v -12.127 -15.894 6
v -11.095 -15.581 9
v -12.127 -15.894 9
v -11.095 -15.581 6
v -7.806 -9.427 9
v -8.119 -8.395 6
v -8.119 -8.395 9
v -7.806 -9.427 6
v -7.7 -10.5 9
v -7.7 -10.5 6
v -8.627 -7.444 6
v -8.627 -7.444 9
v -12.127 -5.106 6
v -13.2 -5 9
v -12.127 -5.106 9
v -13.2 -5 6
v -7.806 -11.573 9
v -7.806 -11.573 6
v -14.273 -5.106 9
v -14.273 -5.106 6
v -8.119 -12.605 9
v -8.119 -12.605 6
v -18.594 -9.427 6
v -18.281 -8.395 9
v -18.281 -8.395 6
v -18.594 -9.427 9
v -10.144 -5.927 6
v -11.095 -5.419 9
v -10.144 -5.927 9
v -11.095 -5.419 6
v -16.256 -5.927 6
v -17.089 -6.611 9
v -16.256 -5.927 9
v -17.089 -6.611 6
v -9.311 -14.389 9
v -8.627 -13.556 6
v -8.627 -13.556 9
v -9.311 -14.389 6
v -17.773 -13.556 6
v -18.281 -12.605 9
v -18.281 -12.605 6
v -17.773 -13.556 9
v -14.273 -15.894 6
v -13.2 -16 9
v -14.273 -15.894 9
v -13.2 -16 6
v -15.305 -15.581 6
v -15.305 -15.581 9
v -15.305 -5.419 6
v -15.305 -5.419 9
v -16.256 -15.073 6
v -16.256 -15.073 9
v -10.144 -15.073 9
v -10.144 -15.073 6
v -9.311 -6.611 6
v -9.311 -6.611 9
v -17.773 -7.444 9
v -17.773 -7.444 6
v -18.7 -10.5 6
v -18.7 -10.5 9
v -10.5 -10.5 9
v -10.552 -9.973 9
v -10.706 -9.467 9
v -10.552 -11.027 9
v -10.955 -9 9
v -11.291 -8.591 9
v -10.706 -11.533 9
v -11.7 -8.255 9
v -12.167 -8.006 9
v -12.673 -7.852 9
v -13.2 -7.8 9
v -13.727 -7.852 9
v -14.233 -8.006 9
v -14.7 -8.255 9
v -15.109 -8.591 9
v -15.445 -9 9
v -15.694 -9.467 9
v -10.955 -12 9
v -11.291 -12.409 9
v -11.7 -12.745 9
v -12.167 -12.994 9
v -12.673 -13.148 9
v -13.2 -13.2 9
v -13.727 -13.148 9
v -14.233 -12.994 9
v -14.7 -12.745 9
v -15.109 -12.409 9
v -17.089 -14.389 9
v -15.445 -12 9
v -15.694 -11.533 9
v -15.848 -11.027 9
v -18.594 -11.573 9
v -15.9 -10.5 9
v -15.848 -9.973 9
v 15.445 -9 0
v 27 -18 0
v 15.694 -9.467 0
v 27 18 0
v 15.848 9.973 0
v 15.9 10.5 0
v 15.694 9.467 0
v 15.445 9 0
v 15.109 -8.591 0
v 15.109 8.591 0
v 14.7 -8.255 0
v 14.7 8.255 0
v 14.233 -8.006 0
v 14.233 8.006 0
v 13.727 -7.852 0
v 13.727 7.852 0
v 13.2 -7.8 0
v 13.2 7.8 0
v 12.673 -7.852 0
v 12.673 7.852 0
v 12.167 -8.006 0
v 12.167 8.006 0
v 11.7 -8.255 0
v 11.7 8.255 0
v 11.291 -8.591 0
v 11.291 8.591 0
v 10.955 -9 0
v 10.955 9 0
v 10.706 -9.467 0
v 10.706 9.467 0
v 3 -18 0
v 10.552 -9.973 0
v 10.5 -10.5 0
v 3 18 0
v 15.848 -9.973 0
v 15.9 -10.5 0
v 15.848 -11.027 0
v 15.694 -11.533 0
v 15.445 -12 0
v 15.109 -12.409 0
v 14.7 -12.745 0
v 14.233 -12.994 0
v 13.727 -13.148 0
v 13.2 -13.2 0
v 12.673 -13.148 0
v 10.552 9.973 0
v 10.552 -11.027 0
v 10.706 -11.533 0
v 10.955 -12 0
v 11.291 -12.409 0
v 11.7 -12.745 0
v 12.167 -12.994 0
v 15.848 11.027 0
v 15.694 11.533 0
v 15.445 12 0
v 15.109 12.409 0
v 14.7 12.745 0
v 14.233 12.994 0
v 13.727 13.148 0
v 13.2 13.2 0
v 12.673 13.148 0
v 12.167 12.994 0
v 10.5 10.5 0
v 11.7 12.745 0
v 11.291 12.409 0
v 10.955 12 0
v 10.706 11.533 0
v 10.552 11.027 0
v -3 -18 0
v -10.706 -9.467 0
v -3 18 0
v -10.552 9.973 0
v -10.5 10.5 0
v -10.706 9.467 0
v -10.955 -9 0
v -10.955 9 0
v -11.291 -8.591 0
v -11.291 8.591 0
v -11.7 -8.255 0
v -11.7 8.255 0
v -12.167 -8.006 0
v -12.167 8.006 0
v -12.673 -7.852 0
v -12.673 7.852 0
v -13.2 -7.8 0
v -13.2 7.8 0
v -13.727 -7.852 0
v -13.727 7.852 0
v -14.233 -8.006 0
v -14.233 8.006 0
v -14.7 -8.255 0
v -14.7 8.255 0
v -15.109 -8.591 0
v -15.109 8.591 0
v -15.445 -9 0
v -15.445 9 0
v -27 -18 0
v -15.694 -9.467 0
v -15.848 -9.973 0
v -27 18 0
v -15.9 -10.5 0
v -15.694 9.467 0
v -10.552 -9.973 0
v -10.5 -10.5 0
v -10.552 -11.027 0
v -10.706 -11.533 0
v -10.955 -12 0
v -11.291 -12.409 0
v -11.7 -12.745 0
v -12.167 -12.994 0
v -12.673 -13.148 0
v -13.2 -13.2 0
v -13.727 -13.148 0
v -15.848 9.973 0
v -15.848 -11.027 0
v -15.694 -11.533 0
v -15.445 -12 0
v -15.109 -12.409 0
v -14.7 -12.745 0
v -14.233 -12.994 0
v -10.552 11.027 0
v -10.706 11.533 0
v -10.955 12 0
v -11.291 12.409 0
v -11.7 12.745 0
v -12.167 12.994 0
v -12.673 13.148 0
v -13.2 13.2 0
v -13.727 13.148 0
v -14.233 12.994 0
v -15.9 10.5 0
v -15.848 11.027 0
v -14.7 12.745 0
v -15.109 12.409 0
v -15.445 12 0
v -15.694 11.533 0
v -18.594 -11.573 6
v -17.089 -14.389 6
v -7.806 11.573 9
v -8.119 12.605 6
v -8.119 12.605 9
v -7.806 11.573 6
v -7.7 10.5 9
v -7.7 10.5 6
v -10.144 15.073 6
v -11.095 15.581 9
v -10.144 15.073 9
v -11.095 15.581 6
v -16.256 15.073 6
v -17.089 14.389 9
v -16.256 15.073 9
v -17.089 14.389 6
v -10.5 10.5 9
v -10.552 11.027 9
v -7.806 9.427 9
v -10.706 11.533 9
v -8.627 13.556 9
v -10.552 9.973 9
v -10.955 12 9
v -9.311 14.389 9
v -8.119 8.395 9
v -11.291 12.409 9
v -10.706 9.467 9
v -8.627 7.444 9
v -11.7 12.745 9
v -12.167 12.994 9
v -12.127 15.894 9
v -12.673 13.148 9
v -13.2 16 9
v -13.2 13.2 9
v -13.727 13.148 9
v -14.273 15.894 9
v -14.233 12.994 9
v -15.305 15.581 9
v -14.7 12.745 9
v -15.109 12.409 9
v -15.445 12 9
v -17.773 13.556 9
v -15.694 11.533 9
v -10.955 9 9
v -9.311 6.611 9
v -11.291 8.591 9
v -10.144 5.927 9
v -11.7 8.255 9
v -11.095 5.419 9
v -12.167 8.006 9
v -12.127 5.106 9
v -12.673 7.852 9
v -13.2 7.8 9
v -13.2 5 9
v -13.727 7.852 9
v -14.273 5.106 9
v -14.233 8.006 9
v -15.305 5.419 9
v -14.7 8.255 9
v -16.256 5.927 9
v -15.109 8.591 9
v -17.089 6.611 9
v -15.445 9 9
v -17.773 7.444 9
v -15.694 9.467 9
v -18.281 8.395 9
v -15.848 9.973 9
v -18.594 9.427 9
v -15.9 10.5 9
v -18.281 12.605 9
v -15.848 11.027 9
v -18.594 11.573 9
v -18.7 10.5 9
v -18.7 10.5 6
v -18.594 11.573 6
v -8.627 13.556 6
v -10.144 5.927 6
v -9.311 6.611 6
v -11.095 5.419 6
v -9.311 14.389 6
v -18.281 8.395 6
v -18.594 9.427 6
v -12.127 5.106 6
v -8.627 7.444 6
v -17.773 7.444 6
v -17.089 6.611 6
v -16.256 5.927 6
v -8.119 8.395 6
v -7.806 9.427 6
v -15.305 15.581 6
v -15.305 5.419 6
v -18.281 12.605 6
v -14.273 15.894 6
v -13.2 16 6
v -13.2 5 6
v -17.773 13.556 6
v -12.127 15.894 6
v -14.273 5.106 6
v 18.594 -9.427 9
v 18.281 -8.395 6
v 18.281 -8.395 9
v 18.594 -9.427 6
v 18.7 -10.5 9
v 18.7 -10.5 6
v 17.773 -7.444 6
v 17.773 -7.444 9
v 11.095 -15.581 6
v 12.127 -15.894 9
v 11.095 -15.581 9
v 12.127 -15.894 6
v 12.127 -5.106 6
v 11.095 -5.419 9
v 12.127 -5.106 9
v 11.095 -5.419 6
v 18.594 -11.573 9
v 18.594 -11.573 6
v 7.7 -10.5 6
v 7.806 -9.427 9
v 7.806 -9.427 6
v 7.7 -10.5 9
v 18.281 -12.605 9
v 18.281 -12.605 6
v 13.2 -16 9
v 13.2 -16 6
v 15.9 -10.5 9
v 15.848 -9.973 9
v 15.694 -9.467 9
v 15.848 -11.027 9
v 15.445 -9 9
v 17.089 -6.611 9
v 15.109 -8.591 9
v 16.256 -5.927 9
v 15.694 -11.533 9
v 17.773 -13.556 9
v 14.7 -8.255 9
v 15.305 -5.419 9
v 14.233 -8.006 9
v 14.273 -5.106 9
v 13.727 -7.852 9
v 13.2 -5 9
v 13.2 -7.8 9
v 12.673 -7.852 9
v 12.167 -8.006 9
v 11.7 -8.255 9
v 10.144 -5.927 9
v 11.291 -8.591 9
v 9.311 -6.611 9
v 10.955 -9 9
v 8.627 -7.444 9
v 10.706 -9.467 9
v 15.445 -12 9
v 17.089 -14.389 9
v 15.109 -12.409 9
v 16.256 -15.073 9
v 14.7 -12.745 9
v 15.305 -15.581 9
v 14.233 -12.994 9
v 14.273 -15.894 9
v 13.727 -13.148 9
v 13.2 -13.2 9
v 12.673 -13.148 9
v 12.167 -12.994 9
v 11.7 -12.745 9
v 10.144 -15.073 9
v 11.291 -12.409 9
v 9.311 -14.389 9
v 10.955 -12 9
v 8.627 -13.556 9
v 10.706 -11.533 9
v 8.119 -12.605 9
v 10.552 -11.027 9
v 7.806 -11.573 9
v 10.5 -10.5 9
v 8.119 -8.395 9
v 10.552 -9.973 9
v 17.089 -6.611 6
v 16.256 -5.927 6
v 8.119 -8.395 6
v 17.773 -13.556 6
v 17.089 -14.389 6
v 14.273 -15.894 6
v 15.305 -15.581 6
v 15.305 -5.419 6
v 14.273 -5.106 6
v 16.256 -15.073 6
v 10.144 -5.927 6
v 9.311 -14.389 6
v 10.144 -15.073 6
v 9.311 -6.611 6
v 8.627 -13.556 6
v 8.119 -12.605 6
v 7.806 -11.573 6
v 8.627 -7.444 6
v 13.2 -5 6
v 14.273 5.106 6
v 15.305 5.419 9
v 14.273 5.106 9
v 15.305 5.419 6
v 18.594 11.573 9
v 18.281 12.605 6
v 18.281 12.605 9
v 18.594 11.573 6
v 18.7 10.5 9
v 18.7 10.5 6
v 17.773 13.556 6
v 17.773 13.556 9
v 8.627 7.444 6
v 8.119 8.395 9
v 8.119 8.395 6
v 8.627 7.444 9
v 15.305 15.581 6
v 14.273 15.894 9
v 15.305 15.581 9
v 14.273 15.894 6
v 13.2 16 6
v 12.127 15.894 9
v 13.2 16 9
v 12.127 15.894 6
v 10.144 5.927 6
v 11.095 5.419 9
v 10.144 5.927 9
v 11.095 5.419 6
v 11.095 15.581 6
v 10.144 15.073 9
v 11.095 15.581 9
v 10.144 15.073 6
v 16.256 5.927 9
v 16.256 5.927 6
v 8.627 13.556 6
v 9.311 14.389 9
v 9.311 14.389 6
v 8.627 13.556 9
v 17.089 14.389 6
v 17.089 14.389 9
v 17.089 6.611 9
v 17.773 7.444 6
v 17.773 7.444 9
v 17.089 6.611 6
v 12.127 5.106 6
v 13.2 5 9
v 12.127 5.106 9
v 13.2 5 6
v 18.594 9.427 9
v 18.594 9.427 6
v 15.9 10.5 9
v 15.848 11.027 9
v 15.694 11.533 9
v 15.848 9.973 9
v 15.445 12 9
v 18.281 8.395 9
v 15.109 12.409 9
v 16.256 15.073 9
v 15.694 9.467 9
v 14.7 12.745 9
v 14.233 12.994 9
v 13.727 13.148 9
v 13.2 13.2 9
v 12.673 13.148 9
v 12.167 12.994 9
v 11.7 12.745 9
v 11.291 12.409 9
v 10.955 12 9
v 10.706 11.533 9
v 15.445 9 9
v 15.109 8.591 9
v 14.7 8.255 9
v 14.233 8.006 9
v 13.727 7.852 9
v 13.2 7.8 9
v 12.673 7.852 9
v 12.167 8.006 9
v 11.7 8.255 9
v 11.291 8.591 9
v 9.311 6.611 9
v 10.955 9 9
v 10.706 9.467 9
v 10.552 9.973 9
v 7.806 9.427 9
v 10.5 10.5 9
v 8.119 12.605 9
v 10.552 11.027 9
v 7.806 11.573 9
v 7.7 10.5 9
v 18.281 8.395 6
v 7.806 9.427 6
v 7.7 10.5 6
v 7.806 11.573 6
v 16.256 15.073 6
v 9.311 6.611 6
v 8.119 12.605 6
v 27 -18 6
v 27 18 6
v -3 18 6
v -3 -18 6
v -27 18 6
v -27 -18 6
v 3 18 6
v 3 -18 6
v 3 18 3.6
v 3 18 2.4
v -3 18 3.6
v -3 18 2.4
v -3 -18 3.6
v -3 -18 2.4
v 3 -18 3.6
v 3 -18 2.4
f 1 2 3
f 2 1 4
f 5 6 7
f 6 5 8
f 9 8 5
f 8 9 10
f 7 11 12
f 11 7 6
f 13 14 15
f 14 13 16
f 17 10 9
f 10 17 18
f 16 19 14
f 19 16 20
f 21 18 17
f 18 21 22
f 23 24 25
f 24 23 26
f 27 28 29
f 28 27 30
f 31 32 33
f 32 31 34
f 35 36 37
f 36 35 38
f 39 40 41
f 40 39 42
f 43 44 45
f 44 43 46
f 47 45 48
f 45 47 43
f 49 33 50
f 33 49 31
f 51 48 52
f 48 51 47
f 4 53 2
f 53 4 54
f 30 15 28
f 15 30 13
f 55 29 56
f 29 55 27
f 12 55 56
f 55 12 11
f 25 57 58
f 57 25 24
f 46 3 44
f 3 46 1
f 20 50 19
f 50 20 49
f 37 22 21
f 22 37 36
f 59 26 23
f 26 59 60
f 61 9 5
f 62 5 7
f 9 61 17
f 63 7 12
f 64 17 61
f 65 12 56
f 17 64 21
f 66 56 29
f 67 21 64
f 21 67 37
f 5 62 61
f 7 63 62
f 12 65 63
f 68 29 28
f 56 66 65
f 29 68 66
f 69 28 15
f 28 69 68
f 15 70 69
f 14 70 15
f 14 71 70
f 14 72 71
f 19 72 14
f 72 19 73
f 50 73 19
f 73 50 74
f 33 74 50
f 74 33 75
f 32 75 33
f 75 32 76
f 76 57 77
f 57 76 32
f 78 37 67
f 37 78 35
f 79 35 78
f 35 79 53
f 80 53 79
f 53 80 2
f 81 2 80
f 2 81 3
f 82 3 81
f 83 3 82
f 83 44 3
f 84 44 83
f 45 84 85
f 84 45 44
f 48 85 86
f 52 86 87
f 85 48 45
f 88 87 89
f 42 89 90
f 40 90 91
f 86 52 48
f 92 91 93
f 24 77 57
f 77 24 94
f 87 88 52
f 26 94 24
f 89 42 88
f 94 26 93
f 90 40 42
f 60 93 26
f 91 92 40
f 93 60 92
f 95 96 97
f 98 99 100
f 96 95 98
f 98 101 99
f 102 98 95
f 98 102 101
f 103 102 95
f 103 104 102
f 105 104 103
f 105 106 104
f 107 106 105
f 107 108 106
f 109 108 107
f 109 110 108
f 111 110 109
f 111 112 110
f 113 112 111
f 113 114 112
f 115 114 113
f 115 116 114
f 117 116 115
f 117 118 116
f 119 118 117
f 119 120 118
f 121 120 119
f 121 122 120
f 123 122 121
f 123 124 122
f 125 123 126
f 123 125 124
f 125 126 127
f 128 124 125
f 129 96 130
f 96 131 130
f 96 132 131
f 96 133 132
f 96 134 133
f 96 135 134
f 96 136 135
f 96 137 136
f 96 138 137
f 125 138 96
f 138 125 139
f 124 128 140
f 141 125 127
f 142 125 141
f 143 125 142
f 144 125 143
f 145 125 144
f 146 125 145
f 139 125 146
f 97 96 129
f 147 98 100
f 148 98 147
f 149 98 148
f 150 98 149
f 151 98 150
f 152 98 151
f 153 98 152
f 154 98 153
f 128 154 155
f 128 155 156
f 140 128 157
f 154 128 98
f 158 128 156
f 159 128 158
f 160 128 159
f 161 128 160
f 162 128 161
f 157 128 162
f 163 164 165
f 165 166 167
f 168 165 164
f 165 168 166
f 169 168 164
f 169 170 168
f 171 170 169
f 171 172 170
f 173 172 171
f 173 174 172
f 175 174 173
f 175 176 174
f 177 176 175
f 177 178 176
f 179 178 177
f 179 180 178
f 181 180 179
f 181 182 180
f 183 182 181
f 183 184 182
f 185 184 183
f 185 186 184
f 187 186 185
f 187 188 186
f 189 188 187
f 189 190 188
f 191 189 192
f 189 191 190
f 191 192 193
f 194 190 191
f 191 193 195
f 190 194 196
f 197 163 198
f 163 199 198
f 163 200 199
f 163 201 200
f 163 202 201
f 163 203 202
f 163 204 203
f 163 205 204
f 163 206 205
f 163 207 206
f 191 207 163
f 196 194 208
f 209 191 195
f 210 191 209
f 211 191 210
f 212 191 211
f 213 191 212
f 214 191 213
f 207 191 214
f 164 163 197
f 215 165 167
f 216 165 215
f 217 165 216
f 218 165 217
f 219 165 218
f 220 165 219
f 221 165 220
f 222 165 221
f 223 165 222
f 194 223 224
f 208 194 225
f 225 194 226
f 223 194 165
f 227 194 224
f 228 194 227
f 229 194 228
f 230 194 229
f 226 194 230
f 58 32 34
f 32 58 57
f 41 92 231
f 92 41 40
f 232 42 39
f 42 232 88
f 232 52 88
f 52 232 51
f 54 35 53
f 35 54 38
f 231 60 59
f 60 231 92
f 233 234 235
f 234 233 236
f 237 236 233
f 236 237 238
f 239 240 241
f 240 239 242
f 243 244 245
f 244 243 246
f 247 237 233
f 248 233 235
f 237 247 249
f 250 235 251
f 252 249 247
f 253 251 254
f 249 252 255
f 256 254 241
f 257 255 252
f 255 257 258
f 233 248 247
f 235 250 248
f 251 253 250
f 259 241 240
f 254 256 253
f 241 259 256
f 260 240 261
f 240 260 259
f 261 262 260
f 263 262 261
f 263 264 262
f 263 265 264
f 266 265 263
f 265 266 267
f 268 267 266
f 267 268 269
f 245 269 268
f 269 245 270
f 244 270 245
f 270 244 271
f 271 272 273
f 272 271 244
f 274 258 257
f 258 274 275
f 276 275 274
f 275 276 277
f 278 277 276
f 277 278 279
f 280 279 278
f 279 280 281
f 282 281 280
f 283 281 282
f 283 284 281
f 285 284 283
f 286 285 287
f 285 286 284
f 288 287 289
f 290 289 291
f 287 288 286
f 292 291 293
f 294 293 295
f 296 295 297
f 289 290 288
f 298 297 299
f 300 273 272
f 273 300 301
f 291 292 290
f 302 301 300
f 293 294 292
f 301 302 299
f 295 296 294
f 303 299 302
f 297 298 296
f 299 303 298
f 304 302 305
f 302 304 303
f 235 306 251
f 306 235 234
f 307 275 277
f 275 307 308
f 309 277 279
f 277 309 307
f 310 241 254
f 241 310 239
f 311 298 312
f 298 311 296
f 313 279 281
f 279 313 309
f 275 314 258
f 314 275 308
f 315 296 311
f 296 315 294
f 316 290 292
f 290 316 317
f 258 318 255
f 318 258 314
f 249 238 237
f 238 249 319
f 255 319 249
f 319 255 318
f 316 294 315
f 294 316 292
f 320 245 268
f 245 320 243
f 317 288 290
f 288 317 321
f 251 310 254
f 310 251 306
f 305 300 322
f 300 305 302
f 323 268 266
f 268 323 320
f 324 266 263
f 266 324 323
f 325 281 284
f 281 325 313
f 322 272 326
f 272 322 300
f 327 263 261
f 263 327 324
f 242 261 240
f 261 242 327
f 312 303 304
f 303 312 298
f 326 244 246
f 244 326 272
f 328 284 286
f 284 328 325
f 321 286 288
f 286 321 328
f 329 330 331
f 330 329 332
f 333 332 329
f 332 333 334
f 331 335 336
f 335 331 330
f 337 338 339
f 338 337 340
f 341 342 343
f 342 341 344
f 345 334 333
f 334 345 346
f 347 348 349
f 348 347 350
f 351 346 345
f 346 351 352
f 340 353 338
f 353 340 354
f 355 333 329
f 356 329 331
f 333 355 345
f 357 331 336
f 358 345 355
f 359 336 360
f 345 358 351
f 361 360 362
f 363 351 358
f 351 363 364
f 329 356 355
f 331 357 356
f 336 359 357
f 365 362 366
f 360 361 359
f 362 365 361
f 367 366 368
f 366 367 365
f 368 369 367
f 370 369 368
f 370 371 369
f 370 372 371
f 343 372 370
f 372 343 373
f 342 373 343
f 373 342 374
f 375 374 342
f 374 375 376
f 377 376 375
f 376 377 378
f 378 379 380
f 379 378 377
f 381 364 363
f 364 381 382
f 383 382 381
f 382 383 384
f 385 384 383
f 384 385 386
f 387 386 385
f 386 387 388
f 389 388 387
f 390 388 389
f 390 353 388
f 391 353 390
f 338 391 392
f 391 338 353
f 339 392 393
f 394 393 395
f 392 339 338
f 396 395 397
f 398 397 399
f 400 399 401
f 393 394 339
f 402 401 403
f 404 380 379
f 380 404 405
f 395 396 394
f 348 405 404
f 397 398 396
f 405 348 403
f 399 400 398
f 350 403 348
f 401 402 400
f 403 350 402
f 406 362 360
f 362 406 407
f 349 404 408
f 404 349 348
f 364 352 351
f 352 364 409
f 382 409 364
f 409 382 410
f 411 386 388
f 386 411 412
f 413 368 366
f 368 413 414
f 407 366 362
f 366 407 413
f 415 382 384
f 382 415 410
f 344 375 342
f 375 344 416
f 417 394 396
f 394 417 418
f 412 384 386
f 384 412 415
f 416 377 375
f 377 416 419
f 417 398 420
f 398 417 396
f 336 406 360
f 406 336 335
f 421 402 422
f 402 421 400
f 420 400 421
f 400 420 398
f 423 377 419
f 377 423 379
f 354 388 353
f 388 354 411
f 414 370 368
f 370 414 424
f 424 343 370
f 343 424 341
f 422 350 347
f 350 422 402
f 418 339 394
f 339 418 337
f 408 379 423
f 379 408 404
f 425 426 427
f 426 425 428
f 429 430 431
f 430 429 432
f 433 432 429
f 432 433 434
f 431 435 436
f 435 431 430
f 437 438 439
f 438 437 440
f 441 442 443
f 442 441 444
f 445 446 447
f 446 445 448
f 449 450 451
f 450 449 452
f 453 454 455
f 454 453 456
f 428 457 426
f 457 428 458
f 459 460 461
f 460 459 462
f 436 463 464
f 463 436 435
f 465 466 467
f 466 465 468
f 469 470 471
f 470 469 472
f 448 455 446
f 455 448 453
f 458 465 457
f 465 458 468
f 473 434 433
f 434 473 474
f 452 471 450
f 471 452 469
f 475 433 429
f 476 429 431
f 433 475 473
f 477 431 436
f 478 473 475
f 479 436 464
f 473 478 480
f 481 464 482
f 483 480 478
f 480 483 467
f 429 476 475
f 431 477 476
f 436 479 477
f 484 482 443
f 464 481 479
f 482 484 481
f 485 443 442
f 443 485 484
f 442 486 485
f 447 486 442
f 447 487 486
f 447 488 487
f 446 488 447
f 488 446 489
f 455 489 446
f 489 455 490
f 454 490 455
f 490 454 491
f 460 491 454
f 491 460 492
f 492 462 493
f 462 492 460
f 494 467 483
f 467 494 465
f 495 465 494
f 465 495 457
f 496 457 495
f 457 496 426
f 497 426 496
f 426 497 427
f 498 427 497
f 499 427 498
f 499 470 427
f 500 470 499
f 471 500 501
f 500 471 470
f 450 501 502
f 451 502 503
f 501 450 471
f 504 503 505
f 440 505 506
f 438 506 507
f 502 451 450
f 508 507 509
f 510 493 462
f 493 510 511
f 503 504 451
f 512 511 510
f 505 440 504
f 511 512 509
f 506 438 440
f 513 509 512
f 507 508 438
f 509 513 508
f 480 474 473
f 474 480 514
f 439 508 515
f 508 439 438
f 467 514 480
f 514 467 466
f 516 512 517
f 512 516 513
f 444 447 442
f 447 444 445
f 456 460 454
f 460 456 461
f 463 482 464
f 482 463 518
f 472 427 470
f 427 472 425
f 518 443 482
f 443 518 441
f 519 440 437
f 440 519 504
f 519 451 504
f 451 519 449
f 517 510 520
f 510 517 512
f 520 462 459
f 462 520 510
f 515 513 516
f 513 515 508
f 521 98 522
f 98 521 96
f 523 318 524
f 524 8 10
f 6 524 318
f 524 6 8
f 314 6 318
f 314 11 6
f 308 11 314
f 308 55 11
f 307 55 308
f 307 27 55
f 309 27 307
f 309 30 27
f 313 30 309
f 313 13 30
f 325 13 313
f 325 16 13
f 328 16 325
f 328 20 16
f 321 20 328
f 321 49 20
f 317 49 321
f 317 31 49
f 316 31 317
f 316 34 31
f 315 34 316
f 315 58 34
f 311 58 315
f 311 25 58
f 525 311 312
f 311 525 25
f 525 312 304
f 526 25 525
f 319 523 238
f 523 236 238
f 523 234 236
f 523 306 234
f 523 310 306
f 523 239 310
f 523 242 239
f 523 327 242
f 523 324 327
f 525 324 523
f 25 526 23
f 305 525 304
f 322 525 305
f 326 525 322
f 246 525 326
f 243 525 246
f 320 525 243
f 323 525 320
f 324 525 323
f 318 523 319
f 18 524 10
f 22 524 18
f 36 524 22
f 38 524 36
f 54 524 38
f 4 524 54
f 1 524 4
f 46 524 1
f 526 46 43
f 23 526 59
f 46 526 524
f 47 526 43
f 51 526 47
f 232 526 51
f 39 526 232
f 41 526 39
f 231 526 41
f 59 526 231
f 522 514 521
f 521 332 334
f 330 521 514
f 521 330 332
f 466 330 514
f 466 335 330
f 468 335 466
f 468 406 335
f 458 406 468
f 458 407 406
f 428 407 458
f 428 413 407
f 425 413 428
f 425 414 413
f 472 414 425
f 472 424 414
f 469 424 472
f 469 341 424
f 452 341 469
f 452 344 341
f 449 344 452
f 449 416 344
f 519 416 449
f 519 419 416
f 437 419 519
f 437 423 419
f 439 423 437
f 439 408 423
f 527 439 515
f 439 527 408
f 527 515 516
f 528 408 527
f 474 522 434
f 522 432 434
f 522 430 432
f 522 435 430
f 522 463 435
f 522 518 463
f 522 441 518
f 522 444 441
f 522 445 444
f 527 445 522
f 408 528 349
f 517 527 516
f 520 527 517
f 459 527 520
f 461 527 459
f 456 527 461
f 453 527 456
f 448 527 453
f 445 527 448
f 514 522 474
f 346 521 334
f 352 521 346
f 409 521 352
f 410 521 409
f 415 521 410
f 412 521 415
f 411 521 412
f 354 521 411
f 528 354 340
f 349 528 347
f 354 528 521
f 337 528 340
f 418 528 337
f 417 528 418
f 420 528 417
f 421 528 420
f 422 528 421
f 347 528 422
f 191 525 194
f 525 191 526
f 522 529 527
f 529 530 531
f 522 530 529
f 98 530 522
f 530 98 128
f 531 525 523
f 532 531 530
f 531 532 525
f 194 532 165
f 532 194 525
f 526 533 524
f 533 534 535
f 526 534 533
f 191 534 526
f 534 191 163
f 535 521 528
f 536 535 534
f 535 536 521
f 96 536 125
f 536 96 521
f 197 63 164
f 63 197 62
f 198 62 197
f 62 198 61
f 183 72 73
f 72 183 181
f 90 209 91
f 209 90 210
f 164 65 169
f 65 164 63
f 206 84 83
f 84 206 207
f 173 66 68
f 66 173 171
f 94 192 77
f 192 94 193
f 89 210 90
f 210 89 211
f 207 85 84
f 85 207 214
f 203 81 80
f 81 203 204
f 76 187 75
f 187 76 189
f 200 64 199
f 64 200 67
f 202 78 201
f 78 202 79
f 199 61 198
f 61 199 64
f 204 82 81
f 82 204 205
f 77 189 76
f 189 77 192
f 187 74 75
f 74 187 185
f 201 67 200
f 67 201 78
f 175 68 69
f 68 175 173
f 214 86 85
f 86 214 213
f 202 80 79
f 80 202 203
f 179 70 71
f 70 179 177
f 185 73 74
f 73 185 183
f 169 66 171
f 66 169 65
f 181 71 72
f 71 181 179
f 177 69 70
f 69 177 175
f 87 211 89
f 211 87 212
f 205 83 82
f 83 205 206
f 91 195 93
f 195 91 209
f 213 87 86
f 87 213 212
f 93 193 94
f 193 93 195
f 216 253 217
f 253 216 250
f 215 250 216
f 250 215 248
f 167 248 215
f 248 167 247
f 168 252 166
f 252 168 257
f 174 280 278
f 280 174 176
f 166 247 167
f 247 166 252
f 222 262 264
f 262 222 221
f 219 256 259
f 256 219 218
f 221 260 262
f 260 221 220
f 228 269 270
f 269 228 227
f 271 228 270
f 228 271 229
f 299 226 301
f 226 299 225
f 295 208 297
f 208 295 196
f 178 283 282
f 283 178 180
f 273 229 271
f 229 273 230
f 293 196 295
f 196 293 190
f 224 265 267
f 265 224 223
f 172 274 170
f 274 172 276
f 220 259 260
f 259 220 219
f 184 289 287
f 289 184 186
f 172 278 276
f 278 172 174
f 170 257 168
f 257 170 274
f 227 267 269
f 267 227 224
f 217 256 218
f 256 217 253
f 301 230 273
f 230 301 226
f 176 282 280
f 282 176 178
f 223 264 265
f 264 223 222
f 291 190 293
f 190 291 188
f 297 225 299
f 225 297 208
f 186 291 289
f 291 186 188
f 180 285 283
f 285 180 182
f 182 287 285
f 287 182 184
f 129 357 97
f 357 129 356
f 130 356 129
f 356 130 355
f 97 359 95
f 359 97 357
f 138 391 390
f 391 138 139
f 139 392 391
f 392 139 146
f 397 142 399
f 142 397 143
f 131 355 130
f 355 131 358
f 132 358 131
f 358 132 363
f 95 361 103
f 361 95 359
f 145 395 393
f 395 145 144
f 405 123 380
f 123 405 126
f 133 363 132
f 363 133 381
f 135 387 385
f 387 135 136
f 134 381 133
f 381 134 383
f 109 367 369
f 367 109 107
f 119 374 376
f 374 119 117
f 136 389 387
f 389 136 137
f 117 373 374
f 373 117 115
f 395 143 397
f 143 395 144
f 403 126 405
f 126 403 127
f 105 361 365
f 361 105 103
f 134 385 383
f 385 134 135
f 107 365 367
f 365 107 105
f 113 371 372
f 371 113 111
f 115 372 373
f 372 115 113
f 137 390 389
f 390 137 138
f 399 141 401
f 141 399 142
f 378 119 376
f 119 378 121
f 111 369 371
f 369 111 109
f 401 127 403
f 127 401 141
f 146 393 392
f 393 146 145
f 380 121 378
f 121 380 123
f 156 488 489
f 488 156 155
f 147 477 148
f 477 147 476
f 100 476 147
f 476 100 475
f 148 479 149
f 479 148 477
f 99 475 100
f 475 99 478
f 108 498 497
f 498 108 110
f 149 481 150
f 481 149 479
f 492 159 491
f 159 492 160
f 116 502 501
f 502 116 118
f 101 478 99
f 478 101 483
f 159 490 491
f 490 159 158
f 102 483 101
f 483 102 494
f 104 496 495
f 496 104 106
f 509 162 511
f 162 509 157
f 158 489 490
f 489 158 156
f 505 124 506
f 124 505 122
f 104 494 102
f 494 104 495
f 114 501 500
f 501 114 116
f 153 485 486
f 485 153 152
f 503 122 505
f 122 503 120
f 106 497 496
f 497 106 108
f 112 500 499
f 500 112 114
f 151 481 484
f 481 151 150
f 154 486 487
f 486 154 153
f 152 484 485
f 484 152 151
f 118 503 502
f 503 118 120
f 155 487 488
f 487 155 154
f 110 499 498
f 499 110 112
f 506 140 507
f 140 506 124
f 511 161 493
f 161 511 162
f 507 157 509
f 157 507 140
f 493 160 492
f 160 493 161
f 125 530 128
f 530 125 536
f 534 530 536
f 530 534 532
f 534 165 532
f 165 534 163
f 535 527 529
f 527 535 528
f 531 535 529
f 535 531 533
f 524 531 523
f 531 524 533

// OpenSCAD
$fn = 32;

// ----------------------------------------------------------------------
// Living hinge: 54 x 36 mm plates, 1.2 mm flexible web
// ----------------------------------------------------------------------

// --- parameters (mm) ---
plate_len = 24;           // plate length outside the web
plate_w = 36;             // plate width
thick = 6;                // plate thickness
web_half = 3;             // half width of the flex band
web_t = 1.2;              // flexible web thickness
web_z = 2.4;              // web position inside the thickness
boss_d = 11;              // screw boss diameter
boss_h = 9;               // screw boss height
boss_x = 13.2;            // screw boss distance from the web
screw_d = 5.4;            // screw hole

difference() {
  union() {
    /* one flat strip, later thinned at the middle */
    translate([-27, -18, 0]) cube([54, 36, 6]);
    /* screw bosses, sunk 0.5 mm into the plates */
    for (sx = [-13.2, 13.2]) {
      for (sy = [-10.5, 10.5]) {
        translate([sx, sy, 0]) cylinder(h = boss_h, d = boss_d);
      }
    }
  }
  /* channel from below: leaves the web on top of it */
  translate([-3, -20.5, -2.5]) cube([6, 41, 4.9]);
  /* channel from above: thins the web down to web_t */
  translate([-3, -20.5, 3.6]) cube([6, 41, 4.9]);
  /* screw holes through the bosses */
  for (sx = [-13.2, 13.2]) {
    for (sy = [-10.5, 10.5]) {
      translate([sx, sy, -2.5]) cylinder(h = boss_h + 5, d = screw_d);
    }
  }
}
